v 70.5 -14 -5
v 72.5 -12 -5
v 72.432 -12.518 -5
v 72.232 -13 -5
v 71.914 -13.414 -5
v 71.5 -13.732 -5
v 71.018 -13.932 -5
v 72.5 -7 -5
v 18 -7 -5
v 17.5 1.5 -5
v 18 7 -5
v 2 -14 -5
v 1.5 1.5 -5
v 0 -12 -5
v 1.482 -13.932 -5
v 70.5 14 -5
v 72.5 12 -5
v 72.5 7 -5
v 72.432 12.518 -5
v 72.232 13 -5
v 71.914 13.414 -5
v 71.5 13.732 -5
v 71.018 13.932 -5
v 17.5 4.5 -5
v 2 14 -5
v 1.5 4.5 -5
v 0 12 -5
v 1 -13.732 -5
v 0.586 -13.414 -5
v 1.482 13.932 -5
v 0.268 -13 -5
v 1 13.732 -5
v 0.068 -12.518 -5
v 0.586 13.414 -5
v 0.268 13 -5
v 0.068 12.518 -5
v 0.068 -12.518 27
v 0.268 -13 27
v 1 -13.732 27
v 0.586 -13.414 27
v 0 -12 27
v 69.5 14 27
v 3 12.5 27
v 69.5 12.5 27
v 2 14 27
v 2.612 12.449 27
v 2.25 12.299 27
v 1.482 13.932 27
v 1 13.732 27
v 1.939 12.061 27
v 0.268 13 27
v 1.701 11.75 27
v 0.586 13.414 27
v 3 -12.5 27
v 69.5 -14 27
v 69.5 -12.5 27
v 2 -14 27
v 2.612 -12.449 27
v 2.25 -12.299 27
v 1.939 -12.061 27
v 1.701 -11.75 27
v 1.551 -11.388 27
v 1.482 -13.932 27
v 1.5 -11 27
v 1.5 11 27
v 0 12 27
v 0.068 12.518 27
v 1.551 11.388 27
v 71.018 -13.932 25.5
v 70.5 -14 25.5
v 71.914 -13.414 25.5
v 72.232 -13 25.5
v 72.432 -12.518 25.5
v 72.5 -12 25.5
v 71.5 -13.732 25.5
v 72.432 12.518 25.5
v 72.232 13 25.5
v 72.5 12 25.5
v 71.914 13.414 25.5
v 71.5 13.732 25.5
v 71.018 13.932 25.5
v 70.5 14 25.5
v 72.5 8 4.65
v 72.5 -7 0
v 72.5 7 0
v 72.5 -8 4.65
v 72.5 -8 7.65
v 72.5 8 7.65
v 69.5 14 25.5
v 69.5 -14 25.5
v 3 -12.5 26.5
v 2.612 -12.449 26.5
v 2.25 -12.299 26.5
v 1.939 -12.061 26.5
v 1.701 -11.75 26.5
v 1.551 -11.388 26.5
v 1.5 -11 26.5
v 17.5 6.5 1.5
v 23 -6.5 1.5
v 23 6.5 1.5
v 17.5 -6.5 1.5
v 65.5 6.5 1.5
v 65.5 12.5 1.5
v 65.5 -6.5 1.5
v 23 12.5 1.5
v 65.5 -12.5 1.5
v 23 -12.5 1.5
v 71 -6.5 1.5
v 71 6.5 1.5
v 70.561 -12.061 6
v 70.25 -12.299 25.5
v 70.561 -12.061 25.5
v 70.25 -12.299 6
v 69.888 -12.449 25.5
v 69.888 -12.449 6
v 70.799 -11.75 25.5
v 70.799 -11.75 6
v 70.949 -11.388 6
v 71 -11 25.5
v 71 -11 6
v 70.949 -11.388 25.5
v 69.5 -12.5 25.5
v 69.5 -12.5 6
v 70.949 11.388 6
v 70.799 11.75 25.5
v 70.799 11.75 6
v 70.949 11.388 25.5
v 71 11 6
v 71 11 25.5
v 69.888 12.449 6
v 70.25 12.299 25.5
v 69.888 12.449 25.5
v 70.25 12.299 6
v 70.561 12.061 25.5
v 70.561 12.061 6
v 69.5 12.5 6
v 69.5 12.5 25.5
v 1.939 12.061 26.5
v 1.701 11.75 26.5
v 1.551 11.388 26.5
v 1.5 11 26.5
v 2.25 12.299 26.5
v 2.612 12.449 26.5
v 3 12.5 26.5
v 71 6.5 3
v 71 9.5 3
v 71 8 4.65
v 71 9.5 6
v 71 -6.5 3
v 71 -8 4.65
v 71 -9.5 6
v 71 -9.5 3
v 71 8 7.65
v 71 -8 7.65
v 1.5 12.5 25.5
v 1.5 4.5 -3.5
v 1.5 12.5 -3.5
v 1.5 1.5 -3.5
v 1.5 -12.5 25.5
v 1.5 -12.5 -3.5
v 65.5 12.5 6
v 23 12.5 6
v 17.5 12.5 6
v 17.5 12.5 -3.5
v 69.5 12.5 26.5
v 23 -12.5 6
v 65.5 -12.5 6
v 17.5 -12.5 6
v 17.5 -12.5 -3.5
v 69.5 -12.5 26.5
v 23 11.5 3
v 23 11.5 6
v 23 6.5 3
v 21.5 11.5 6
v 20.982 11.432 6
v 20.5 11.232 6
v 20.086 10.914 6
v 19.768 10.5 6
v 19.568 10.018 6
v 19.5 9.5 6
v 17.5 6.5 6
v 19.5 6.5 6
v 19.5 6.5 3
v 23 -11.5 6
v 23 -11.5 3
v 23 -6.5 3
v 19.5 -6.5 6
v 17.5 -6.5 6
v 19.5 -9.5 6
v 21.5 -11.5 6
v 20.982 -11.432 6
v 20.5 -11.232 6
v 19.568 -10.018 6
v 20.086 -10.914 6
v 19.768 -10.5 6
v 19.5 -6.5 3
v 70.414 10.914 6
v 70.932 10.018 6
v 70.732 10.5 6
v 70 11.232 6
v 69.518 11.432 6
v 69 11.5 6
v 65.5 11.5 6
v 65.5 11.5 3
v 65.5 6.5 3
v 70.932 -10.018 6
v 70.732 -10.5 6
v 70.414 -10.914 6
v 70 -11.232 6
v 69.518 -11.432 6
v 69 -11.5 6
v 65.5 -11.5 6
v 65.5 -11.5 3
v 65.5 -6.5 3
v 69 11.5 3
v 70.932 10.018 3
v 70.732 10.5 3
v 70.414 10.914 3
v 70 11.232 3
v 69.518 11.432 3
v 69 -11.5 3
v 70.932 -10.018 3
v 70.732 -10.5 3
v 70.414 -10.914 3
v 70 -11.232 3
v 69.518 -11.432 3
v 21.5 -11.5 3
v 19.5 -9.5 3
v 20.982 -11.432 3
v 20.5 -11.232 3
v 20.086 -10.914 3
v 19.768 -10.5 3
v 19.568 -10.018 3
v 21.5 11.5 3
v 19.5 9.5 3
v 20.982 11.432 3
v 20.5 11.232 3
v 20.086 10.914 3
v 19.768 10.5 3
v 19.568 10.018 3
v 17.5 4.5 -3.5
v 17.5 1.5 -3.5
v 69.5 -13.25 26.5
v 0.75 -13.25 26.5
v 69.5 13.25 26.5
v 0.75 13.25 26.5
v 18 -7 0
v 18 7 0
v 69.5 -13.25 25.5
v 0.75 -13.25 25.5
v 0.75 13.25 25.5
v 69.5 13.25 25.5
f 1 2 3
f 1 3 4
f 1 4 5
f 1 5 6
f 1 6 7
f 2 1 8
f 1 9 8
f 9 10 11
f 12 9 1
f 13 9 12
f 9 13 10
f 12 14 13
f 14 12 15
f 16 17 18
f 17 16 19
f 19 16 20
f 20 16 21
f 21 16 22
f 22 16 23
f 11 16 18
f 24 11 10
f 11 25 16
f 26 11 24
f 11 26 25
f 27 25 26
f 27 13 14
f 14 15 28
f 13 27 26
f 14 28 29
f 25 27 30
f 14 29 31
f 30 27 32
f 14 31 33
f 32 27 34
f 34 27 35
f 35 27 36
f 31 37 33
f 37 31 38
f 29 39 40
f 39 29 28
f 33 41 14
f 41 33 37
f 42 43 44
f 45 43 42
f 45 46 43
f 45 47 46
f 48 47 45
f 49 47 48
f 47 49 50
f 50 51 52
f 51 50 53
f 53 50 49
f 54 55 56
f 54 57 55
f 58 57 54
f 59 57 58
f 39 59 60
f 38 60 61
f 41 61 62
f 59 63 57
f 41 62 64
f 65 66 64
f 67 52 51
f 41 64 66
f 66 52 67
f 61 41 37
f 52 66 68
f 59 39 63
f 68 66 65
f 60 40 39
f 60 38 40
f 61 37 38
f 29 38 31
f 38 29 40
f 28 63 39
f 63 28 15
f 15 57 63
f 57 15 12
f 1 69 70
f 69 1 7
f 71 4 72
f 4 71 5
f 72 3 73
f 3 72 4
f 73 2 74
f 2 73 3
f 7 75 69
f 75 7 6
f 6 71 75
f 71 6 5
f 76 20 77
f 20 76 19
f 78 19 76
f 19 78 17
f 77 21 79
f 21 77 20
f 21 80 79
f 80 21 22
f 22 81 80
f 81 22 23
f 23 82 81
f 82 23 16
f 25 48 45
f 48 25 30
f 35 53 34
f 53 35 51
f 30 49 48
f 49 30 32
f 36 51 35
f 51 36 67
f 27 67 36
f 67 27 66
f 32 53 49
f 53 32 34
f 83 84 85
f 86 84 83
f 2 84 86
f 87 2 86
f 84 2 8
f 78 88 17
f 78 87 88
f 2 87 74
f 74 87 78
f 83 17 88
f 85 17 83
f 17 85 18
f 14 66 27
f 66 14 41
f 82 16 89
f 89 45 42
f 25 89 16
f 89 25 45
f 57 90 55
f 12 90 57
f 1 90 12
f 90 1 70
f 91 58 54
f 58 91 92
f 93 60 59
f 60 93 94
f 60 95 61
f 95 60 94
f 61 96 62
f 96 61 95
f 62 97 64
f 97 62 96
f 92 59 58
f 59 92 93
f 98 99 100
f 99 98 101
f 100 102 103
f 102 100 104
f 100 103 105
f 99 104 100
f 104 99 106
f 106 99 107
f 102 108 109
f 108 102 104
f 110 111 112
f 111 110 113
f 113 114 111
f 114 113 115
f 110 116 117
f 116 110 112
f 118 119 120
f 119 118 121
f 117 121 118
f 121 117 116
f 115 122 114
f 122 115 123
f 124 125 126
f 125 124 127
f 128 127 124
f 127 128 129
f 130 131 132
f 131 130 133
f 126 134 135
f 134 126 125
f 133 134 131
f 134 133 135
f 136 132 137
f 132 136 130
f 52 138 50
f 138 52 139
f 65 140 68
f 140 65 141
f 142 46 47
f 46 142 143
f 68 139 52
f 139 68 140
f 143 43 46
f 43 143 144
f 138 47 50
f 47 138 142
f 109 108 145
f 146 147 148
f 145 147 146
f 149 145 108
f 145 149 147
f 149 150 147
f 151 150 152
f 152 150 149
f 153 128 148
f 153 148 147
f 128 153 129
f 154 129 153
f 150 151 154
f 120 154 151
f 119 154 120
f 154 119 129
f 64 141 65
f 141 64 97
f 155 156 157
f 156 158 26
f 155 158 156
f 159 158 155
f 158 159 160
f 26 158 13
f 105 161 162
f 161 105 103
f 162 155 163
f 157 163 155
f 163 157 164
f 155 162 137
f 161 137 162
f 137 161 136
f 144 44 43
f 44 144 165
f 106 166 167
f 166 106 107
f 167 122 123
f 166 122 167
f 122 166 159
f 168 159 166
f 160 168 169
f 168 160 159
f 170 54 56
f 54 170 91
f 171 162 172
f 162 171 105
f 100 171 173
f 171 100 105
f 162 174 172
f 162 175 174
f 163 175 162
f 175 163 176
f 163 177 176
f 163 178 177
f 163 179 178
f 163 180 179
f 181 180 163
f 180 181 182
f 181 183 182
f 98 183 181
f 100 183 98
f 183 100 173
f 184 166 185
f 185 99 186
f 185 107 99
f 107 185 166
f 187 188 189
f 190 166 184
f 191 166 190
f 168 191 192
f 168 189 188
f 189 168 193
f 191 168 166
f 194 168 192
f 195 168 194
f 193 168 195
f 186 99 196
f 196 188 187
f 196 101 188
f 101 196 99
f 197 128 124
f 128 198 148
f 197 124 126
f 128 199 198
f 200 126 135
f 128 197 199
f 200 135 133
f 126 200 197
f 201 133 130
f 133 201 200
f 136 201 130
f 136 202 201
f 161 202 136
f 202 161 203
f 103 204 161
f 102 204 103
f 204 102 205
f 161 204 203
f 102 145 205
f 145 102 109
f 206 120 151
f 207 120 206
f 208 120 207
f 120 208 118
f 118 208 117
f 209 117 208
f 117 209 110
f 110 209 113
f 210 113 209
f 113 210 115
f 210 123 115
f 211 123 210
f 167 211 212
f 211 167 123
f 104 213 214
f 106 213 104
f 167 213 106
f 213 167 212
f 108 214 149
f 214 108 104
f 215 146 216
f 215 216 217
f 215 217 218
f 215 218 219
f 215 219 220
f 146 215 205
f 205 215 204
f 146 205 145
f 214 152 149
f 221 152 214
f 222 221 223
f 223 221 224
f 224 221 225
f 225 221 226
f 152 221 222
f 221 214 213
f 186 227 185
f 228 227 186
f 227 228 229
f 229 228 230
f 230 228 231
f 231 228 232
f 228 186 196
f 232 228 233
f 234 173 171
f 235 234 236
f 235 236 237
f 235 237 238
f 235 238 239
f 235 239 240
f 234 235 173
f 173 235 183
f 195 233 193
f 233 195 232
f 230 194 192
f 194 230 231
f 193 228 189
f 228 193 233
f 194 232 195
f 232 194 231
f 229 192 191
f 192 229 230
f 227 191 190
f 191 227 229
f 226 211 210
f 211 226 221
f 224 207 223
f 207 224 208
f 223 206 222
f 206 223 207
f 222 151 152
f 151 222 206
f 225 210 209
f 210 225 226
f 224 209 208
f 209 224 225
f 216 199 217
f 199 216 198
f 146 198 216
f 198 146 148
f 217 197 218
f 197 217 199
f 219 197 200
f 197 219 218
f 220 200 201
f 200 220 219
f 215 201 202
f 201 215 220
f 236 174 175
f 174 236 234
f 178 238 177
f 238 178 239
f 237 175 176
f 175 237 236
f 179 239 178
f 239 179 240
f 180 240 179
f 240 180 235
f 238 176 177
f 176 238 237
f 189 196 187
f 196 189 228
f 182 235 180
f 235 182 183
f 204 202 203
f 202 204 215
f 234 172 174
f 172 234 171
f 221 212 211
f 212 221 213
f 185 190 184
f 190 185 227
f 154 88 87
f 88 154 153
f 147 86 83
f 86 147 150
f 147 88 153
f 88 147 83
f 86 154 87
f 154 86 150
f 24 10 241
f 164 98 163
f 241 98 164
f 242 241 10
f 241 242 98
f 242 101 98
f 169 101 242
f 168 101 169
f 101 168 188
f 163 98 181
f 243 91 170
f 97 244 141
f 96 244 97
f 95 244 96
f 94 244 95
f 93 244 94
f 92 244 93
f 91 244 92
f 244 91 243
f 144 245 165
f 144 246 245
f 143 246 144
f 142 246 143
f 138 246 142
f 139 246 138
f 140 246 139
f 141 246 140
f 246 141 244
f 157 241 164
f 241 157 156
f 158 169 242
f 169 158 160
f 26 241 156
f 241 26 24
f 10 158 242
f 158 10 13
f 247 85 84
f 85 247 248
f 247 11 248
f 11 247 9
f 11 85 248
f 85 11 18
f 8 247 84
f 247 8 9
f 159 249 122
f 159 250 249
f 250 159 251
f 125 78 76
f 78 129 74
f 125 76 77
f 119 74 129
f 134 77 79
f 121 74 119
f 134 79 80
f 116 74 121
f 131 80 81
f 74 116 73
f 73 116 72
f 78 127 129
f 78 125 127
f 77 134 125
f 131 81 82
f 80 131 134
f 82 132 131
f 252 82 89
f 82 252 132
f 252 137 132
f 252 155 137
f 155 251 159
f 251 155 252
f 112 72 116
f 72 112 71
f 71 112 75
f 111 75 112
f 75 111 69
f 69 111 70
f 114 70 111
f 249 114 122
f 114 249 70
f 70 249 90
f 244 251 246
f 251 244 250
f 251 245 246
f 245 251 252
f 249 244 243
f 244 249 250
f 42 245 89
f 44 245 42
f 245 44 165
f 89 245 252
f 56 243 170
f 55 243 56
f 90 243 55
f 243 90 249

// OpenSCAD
// s@ecloud.org 2022
// License: Creative Commons - Attribution

boardWidth = 23;
boardLength = 51.5;
boardHeight = 1.65;
totalInnerHeight = 24;
topStickout = 18;

headerCutoutLength = 16;
headerCutoutWidth = 3;

wallThickness = 1.5;
velcroThickness = 5;
//preview[view:south, tilt:box]
//Number of facets
$fn = 24;
//(x axis) - actually length
width = boardLength + topStickout + wallThickness * 2;
//(y axis) - actually width
//~ depth = boardWidth + 2 + wallThickness * 2;
depth = 28;
//(z axis)
height = totalInnerHeight + wallThickness;

module quad(length, width) {
	children([0:$children-1]);
	translate([length, 0, 0])
		children([0:$children-1]);
	translate([length, width, 0])
		children([0:$children-1]);
	translate([0, width, 0])
		children([0:$children-1]);
}

module round4CornersCube(dims, r=1, centerXY=false)
{
	translate(centerXY ? [dims[0] / -2, dims[1] / -2, 0] : [0,0,0])
	union() {
		translate([0, r, 0])
			cube([dims[0], dims[1] - r * 2, dims[2]]);
		translate([r, 0, 0])
			cube([dims[0] - r * 2, dims[1], dims[2]]);
		translate([r, r, 0])
			quad(dims[0] - r * 2, dims[1] - r * 2)
				cylinder(r = r, h = dims[2]);
	}
}

module roundedCube( x, y, z, r ) {
	hull() {
		translate([r, r, r]) sphere(r);
		translate([r, y-r, r]) sphere(r);
		translate([r, r, z-r]) sphere(r);
		translate([r, y-r, z-r]) sphere(r);
		translate([x-r, r, r]) sphere(r);
		translate([x-r, y-r, r]) sphere(r);
		translate([x-r, r, z-r]) sphere(r);
		translate([x-r, y-r, z-r]) sphere(r);
	}
}

module boardCutout() {
	round4CornersCube([boardLength, boardWidth, boardHeight + 2], 2);
	// SD slot
	translate([boardLength - 4, (boardWidth - 16) / 2, boardHeight])
		cube([20, 16, 3]);
}

module pegs() {
	radius = 4;
	$fn=16;
	xLeft = topStickout - 1;
	translate([xLeft, boardWidth / 2 - 5, 1])
			cube([6, 6, 5]);
	translate([xLeft, boardWidth / -2 - 1, 1])
			cube([6, 6, 5]);
	translate([xLeft + boardLength - 3, boardWidth/ 2 - 5, 1])
			cube([6, 6, 5]);
	translate([xLeft + boardLength - 3, boardWidth / -2 - 1, 1])
			cube([6, 6, 5]);
}

module box() {
	difference() {
		union() {
			// main box and cutout
			difference() {
				translate([0, -depth/2, -velcroThickness]) {
					round4CornersCube([width,depth,height + velcroThickness + wallThickness], 2);
				}

				translate([wallThickness, -depth/2 + wallThickness, wallThickness]) {
					round4CornersCube([width - (wallThickness * 2), depth - (wallThickness * 2), height + 1], 1.5);
				}
			}

			pegs();
		}
		translate([wallThickness + topStickout, -boardWidth/2, 3])
			boardCutout();
		translate([wallThickness, -depth/2 + wallThickness, wallThickness - velcroThickness])
			cube([headerCutoutLength, depth - wallThickness * 2, 30]);
		translate([wallThickness, 3 - headerCutoutWidth / 2, -20])
			cube([headerCutoutLength, headerCutoutWidth, 40]);
		// maybe would fit the edge profile of the uradmonitor case, but also would make it harder to print
		//~ translate([-5, -depth/2, -20 + wallThickness - velcroThickness])
			//~ roundedCube(width + 10, depth, 20, 5);
		translate([topStickout, -7, -velcroThickness])
			cube([width, 14, velcroThickness]);
		translate([wallThickness / 2, wallThickness / 2 -depth/2, totalInnerHeight + wallThickness])
			cube([100, depth - wallThickness, 1]);
		translate([width - wallThickness - 1.5, -depth/2, totalInnerHeight + wallThickness])
			cube([10, depth, 3]);
	}
}

box();
